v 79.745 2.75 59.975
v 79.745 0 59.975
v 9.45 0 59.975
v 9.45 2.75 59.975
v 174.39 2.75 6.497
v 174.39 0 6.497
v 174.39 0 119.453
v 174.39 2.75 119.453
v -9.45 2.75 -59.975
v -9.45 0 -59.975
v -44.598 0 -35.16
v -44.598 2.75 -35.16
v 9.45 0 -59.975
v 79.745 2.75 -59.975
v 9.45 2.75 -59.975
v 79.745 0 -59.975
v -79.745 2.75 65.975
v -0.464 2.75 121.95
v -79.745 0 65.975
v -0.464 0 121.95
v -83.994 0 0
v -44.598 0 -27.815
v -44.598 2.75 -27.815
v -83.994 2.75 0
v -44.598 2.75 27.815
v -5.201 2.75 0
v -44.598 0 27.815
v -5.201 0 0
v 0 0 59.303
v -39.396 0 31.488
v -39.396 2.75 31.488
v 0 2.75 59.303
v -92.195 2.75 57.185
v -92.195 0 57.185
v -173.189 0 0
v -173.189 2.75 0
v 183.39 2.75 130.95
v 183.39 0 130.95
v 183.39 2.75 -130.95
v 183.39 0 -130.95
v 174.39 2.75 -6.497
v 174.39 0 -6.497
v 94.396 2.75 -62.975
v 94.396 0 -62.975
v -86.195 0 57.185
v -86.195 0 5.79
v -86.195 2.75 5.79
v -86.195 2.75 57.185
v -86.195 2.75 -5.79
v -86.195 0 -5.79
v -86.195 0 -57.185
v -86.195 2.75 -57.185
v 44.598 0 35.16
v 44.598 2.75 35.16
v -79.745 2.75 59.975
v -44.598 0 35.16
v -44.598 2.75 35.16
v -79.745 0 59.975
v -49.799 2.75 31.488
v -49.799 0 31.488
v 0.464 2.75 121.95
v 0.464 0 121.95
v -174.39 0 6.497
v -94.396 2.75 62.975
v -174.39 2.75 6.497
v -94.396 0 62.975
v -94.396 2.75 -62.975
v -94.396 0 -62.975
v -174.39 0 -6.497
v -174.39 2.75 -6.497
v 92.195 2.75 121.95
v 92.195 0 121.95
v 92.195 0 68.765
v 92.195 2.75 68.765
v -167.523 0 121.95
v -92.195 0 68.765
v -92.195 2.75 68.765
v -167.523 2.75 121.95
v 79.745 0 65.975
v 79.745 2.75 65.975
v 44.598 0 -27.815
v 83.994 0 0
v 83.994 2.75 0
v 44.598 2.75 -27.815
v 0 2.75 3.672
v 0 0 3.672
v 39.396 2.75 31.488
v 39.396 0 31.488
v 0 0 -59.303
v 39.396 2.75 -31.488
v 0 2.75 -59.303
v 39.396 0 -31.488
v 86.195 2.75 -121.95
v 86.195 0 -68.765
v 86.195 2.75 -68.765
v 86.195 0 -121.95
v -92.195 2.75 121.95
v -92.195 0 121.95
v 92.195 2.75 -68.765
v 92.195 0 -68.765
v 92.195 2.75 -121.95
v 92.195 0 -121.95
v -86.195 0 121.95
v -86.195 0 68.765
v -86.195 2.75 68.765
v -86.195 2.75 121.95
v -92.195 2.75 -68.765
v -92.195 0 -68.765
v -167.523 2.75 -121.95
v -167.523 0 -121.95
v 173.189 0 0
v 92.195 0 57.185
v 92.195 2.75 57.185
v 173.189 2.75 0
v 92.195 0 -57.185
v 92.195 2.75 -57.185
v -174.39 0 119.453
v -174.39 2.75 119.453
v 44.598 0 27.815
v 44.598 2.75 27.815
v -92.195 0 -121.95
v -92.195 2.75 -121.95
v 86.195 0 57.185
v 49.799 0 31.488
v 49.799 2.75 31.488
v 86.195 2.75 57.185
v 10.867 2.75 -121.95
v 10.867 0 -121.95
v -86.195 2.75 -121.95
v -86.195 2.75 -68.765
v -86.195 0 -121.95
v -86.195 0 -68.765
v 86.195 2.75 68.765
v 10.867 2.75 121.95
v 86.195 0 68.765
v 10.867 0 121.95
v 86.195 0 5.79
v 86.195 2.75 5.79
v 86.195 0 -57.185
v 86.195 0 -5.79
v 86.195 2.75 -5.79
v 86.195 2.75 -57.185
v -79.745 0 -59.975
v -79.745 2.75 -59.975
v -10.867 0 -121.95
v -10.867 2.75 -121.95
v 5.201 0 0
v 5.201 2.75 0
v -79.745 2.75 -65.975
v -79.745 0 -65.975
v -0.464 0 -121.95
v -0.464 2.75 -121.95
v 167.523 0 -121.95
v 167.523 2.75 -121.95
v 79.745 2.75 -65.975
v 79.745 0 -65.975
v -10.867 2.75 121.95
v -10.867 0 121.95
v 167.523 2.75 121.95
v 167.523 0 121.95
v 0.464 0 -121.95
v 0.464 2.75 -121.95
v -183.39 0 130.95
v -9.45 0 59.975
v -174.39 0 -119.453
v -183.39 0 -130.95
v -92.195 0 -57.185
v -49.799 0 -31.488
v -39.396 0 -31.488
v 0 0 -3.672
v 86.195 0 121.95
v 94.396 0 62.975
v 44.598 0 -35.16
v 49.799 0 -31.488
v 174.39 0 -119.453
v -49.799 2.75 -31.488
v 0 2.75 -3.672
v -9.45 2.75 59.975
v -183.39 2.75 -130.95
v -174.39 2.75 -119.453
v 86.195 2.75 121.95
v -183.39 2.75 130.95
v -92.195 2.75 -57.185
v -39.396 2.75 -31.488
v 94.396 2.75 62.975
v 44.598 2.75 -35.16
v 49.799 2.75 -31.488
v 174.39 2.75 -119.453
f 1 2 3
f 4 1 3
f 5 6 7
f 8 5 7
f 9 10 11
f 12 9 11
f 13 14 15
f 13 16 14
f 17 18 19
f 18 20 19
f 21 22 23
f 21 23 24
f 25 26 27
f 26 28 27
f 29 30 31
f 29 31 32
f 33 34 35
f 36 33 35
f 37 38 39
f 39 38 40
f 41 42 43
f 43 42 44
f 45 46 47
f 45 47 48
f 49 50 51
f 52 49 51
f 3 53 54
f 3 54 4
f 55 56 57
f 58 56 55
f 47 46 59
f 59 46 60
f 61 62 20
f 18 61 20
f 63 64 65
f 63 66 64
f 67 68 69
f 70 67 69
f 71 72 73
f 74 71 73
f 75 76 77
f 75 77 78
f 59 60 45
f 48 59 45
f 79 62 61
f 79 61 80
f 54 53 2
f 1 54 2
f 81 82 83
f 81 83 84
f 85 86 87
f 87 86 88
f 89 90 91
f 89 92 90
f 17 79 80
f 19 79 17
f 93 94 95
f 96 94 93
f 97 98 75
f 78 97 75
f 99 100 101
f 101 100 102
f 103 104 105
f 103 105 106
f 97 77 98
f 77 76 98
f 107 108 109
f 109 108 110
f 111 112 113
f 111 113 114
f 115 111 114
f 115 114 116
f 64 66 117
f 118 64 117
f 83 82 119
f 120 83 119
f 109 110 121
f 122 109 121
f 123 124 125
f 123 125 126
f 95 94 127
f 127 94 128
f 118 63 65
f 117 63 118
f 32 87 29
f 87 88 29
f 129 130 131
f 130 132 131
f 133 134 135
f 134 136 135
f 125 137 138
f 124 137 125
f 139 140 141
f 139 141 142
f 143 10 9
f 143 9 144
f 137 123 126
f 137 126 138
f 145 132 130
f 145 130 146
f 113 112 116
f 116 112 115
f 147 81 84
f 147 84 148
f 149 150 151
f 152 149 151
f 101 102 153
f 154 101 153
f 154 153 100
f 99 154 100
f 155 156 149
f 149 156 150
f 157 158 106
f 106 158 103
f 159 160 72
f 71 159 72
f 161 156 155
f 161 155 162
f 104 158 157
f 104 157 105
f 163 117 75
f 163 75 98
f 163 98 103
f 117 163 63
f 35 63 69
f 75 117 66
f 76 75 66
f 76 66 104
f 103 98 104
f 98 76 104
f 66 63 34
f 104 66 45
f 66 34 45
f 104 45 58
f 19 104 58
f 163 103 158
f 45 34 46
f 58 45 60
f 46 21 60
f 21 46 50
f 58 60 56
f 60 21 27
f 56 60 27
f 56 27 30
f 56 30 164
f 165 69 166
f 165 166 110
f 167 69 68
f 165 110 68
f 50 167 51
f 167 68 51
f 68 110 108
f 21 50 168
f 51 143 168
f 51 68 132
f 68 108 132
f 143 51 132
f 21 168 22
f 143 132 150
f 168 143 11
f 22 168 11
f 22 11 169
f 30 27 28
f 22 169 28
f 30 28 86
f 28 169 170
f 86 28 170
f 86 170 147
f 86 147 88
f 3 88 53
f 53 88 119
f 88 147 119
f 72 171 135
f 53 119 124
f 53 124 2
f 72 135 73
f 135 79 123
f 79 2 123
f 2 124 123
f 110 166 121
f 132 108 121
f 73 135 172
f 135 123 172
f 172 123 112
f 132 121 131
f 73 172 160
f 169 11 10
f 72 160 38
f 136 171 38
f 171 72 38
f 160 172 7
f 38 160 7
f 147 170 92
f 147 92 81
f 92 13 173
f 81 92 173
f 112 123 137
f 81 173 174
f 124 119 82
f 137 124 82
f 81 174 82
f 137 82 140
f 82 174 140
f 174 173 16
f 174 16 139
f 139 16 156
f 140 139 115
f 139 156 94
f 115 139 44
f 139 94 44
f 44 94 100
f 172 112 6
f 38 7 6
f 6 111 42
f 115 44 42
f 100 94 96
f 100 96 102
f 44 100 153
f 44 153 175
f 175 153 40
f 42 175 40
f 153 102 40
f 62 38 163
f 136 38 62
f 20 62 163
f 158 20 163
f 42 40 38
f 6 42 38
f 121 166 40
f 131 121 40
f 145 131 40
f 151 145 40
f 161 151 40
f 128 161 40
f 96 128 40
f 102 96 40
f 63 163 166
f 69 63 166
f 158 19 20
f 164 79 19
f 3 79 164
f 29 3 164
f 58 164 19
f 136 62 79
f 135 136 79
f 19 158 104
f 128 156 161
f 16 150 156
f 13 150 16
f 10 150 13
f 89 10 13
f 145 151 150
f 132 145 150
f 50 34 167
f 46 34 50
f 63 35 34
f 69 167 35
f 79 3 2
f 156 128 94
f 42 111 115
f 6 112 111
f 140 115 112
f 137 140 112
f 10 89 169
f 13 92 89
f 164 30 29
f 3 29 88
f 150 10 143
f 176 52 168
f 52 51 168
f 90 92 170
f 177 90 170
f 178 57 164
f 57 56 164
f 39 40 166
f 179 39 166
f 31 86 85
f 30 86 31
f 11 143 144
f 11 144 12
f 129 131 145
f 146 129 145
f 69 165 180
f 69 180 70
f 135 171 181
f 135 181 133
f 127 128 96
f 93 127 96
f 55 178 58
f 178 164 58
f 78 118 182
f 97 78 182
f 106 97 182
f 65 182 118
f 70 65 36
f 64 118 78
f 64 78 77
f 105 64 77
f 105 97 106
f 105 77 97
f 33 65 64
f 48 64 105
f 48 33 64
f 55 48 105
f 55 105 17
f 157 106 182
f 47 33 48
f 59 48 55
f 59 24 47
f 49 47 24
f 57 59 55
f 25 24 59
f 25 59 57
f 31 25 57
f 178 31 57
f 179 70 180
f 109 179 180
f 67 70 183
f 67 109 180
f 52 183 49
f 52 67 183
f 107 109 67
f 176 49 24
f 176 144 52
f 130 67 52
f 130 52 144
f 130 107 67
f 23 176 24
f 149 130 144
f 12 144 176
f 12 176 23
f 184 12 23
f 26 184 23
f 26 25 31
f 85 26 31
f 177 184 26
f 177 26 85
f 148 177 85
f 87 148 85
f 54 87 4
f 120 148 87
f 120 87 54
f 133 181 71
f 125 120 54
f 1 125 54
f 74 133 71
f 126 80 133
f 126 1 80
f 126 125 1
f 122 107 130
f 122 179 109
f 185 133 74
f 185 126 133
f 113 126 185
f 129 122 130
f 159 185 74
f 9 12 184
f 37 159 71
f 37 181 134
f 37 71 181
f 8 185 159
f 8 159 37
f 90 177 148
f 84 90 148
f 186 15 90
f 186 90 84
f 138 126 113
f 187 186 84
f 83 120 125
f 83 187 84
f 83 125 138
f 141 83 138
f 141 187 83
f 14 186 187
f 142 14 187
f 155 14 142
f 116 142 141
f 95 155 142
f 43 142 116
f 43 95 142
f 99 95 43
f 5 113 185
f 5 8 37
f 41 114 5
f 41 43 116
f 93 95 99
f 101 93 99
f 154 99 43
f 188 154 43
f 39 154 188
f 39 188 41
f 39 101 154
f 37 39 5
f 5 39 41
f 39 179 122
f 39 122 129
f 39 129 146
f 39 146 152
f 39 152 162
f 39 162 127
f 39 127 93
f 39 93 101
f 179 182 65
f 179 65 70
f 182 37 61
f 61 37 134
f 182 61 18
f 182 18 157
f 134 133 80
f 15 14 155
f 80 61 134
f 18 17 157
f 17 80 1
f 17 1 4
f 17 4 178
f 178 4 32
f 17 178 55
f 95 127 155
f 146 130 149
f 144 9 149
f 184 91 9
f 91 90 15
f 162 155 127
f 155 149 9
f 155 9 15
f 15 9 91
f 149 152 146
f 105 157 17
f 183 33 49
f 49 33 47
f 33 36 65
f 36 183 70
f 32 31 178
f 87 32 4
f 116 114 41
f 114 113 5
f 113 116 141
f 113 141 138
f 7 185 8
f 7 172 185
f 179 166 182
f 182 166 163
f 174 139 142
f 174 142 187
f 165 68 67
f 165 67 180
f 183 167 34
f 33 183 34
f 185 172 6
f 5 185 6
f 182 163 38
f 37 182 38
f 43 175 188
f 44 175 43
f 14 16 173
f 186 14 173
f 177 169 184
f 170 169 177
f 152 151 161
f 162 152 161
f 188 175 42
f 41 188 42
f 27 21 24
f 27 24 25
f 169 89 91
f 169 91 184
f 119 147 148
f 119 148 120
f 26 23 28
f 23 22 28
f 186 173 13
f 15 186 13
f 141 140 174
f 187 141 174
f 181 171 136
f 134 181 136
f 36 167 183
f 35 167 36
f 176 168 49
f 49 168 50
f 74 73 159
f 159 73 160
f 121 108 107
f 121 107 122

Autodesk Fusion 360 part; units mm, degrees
sketch "Sketch1" plane through (0, 0, 0) normal (0, 1, 0) x (1, 0, 0)
  line L0 (178.39, 125.95) -> (-178.39, 125.95)
  line L1 (-178.39, 125.95) -> (-178.39, -125.95)
  line L2 (-178.39, -125.95) -> (178.39, -125.95)
  line L3 (178.39, -125.95) -> (178.39, 125.95)
  line L4 (178.39, 125.95) -> (-178.39, -125.95) construction
  line L5 (-178.39, 125.95) -> (178.39, -125.95) construction
  line L6 (-178.39, 0) -> (0, 125.95) construction
  line L7 (0, 125.95) -> (178.39, 0) construction
  line L8 (178.39, 0) -> (0, -125.95) construction
  line L9 (-178.39, 0) -> (0, -125.95) construction
  line L10 (-89.195, -62.975) -> (89.195, -62.975) construction
  line L11 (-89.195, 62.975) -> (89.195, 62.975) construction
  line L12 (89.195, 62.975) -> (89.195, -62.975) construction
  line L13 (-89.195, -62.975) -> (-89.195, 62.975) construction
  line L14 (-89.195, 0) -> (0, 62.975) construction
  line L15 (0, 62.975) -> (89.195, 0) construction
  line L16 (89.195, 0) -> (0, -62.975) construction
  line L17 (-89.195, 0) -> (0, -62.975) construction
  line L18 (-89.195, -62.975) -> (-89.195, -125.95) construction
  line L19 (89.195, -62.975) -> (89.195, -125.95) construction
  line L20 (89.195, 62.975) -> (89.195, 125.95) construction
  line L21 (-89.195, 62.975) -> (-89.195, 125.95) construction
  line L22 (-178.39, 125.95) -> (-89.195, 62.975)
  line L23 (-89.195, 62.975) -> (-90.9253, 60.5243)
  line L24 (-90.9253, 60.5243) -> (-180.1203, 123.4993)
  line L25 (-180.1203, 123.4993) -> (-178.39, 125.95)
  line L26 (-87.4647, 65.4257) -> (-176.6597, 128.4007)
  line L27 (-89.195, 62.975) -> (-87.4647, 65.4257)
  line L28 (-176.6597, 128.4007) -> (-178.39, 125.95)
  line L29 (-89.195, 125.95) -> (-89.195, 62.975)
  line L30 (-89.195, 62.975) -> (-92.195, 62.975)
  line L31 (-92.195, 62.975) -> (-92.195, 125.95)
  line L32 (-92.195, 125.95) -> (-89.195, 125.95)
  line L33 (-86.195, 62.975) -> (-86.195, 125.95)
  line L34 (-89.195, 62.975) -> (-86.195, 62.975)
  line L35 (-178.39, 0) -> (-89.195, 62.975)
  line L36 (-89.195, 62.975) -> (-90.9253, 65.4257)
  line L37 (-90.9253, 65.4257) -> (-180.1203, 2.4507)
  line L38 (-180.1203, 2.4507) -> (-178.39, 0)
  line L39 (-87.4647, 60.5243) -> (-176.6597, -2.4507)
  line L40 (-89.195, 62.975) -> (-87.4647, 60.5243)
  line L41 (-89.195, 62.975) -> (-89.195, 0)
  line L42 (-89.195, 0) -> (-92.195, 0)
  line L43 (-92.195, 0) -> (-92.195, 62.975)
  line L44 (-92.195, 62.975) -> (-89.195, 62.975)
  line L45 (-86.195, 0) -> (-86.195, 62.975)
  line L46 (-89.195, 0) -> (-86.195, 0)
  line L47 (-89.195, 0) -> (0, 62.975)
  line L48 (0, 62.975) -> (1.7303, 60.5243)
  line L49 (1.7303, 60.5243) -> (-87.4647, -2.4507)
  line L50 (-87.4647, -2.4507) -> (-89.195, 0)
  line L51 (0, 62.975) -> (-1.7303, 65.4257)
  line L52 (-1.7303, 65.4257) -> (-90.9253, 2.4507)
  line L53 (178.39, -125.95) -> (-89.195, 62.975)
  line L54 (-89.195, 62.975) -> (-87.4647, 65.4257)
  line L55 (-87.4647, 65.4257) -> (180.1203, -123.4993)
  line L56 (180.1203, -123.4993) -> (178.39, -125.95)
  line L57 (-90.9253, 60.5243) -> (176.6597, -128.4007)
  line L58 (0, 125.95) -> (-89.195, 62.975)
  line L59 (-89.195, 62.975) -> (-87.4647, 60.5243)
  line L60 (-87.4647, 60.5243) -> (1.7303, 123.4993)
  line L61 (1.7303, 123.4993) -> (0, 125.95)
  line L62 (-90.9253, 65.4257) -> (-1.7303, 128.4007)
  line L63 (-89.195, 62.975) -> (89.195, 62.975)
  line L64 (89.195, 62.975) -> (89.195, 65.975)
  line L65 (89.195, 65.975) -> (-89.195, 65.975)
  line L66 (-89.195, 65.975) -> (-89.195, 62.975)
  line L67 (89.195, 59.975) -> (-89.195, 59.975)
  line L68 (0, 62.975) -> (89.195, 0)
  line L69 (89.195, 0) -> (90.9253, 2.4507)
  line L70 (90.9253, 2.4507) -> (1.7303, 65.4257)
  line L71 (1.7303, 65.4257) -> (0, 62.975)
  line L72 (87.4647, -2.4507) -> (-1.7303, 60.5243)
  line L73 (-178.39, -125.95) -> (178.39, 125.95)
  line L74 (178.39, 125.95) -> (176.6597, 128.4007)
  line L75 (176.6597, 128.4007) -> (-180.1203, -123.4993)
  line L76 (-180.1203, -123.4993) -> (-178.39, -125.95)
  line L77 (180.1203, 123.4993) -> (-176.6597, -128.4007)
  line L78 (-89.195, -125.95) -> (-89.195, 0)
  line L79 (-89.195, 0) -> (-92.195, 0)
  line L80 (-92.195, 0) -> (-92.195, -125.95)
  line L81 (-92.195, -125.95) -> (-89.195, -125.95)
  line L82 (-86.195, 0) -> (-86.195, -125.95)
  line L83 (-178.39, 0) -> (0, -125.95)
  line L84 (0, -125.95) -> (1.7303, -123.4993)
  line L85 (1.7303, -123.4993) -> (-176.6597, 2.4507)
  line L86 (-176.6597, 2.4507) -> (-178.39, 0)
  line L87 (-1.7303, -128.4007) -> (-180.1203, -2.4507)
  line L88 (0, -62.975) -> (-89.195, 0)
  line L89 (-89.195, 0) -> (-87.4647, 2.4507)
  line L90 (-87.4647, 2.4507) -> (1.7303, -60.5243)
  line L91 (1.7303, -60.5243) -> (0, -62.975)
  line L92 (-90.9253, -2.4507) -> (-1.7303, -65.4257)
  line L93 (178.39, 0) -> (0, -125.95)
  line L94 (0, -125.95) -> (-1.7303, -123.4993)
  line L95 (-1.7303, -123.4993) -> (176.6597, 2.4507)
  line L96 (176.6597, 2.4507) -> (178.39, 0)
  line L97 (1.7303, -128.4007) -> (180.1203, -2.4507)
  line L98 (0, 125.95) -> (178.39, 0)
  line L99 (178.39, 0) -> (180.1203, 2.4507)
  line L100 (180.1203, 2.4507) -> (1.7303, 128.4007)
  line L101 (1.7303, 128.4007) -> (0, 125.95)
  line L102 (176.6597, -2.4507) -> (-1.7303, 123.4993)
  line L103 (89.195, 125.95) -> (89.195, -125.95)
  line L104 (89.195, -125.95) -> (92.195, -125.95)
  line L105 (92.195, -125.95) -> (92.195, 125.95)
  line L106 (92.195, 125.95) -> (89.195, 125.95)
  line L107 (86.195, -125.95) -> (86.195, 125.95)
  line L108 (0, -62.975) -> (89.195, 0)
  line L109 (89.195, 0) -> (87.4647, 2.4507)
  line L110 (87.4647, 2.4507) -> (-1.7303, -60.5243)
  line L111 (-1.7303, -60.5243) -> (0, -62.975)
  line L112 (90.9253, -2.4507) -> (1.7303, -65.4257)
  line L113 (-89.195, -62.975) -> (89.195, -62.975)
  line L114 (89.195, -62.975) -> (89.195, -59.975)
  line L115 (89.195, -59.975) -> (-89.195, -59.975)
  line L116 (-89.195, -59.975) -> (-89.195, -62.975)
  line L117 (89.195, -65.975) -> (-89.195, -65.975)
  line L118 (-178.39, 125.95) -> (-174.39, 125.95)
  line L119 (-174.39, 125.95) -> (-174.39, -126.4932)
  line L120 (-174.39, -126.4932) -> (-178.39, -126.4932)
  line L121 (-178.39, -126.4932) -> (-178.39, 125.95)
  line L122 (-178.39, -125.95) -> (178.39, -125.95)
  line L123 (178.39, -125.95) -> (178.39, -121.95)
  line L124 (178.39, -121.95) -> (-178.39, -121.95)
  line L125 (-178.39, -121.95) -> (-178.39, -125.95)
  line L126 (178.39, 125.95) -> (174.39, 125.95)
  line L127 (174.39, 125.95) -> (174.39, -125.95)
  line L128 (174.39, -125.95) -> (178.39, -125.95)
  line L129 (178.39, -125.95) -> (178.39, 125.95)
  line L130 (178.39, 125.95) -> (-178.39, 125.95)
  line L131 (-178.39, 125.95) -> (-178.39, 121.95)
  line L132 (-178.39, 121.95) -> (178.39, 121.95)
  line L133 (178.39, 121.95) -> (178.39, 125.95)
  line L134 (183.39, 130.95) -> (-183.39, 130.95)
  line L135 (-183.39, 130.95) -> (-183.39, -130.95)
  line L136 (-183.39, -130.95) -> (183.39, -130.95)
  line L137 (183.39, -130.95) -> (183.39, 130.95)
  line L138 (183.39, 130.95) -> (-183.39, -130.95) construction
  line L139 (-183.39, 130.95) -> (183.39, -130.95) construction
  line L140 (0, 130.95) -> (0, 125.95) construction
  line L141 (-183.39, 66.313) -> (-178.39, 66.313) construction
  dimension "d1" = 356.78
  dimension "d2" = 251.9
  dimension "d3" = 3
  dimension "d4" = 3
  dimension "d5" = 3
  dimension "d6" = 3
  dimension "d7" = 3
  dimension "d8" = 3
  dimension "d9" = 3
  dimension "d10" = 3
  dimension "d11" = 3
  dimension "d12" = 3
  dimension "d13" = 3
  dimension "d14" = 3
  dimension "d15" = 3
  dimension "d16" = 3
  dimension "d17" = 3
  dimension "d18" = 3
  dimension "d19" = 3
  dimension "d20" = 3
  dimension "d21" = 4
  dimension "d22" = 4
  dimension "d23" = 4
  dimension "d24" = 4
  dimension "d27" = 5
extrude "Extrude1" add sketch "Sketch1" along normal blind 2.75 contours L0 L73 L126 L127 L130 | L3 L73 L77 L127 L129 L132 L133 | L0 L74 L75 L126 L130 | L0 L73 L75 L127 L130 L132 | L3 L77 L129 L132 L133 | L73 L127 L132 | L0 L75 L105 L130 L132 | L3 L77 L100 L127 L129 L132 | L77 L127 L132 | L73 L77 L100 L105 L127 L132 | L73 L75 L105 L132 | L0 L103 L105 L106 L130 L132 | L3 L99 L100 L129 | L3 L95 L96 L98 L100 L127 L129 | L73 L100 L105 | L73 L75 L100 L105 | L0 L103 L107 L130 L132 | L75 L103 L105 L132 | L3 L93 L97 L127 L129 | L95 L96 L98 | L93 L95 L98 L102 L127 | L77 L98 L100 L105 L127 | L77 L100 L105 | L73 L77 L98 L100 L105 | L64 L73 L100 L103 | L0 L100 L107 L130 L132 | L100 L103 L107 L132 | L65 L75 L103 | L65 L75 L100 L107 | L3 L55 L97 L124 L127 L129 | L93 L102 L127 | L95 L98 L127 | L95 L98 L102 L105 L127 | L77 L98 L105 | L63 L73 L102 L107 | L64 L65 L75 L98 L103 | L67 L73 L102 L103 | L63 L75 L98 L107 | L77 L98 L103 | L0 L98 L100 L130 L132 | L0 L100 L101 L130 | L65 L75 L98 L107 | L65 L98 L100 L107 L132 | L3 L55 L123 L124 L129 | L55 L93 L97 L105 L127 | L93 L95 L102 L105 L127 | L95 L102 L127 | L77 L98 L102 L105 | L63 L102 L107 | L63 L75 L107 | L67 L73 L102 L107 | L73 L102 L107 | L75 L98 L107 | L67 L102 L103 | L0 L58 L62 L130 L132 | L58 L60 L61 L132 | L60 L61 L98 L102 L132 | L65 L98 L107 | L3 L55 L56 L123 L129 | L3 L53 L55 L123 L124 L127 L129 | L55 L124 L127 | L55 L97 L105 | L53 L55 L97 L105 L124 L127 | L55 L93 L105 | L55 L93 L95 L105 | L69 L70 L95 L102 L103 L105 | L70 L77 L103 L107 | L67 L77 L102 L107 | L63 L67 L70 L75 | L65 L75 L98 L102 L107 | L67 L73 L75 L102 L107 | L51 L52 L60 L63 L65 L70 L71 L102 | L67 L73 L107 | L0 L33 L62 L130 L132 | L58 L60 L65 L132 | L33 L58 L62 L65 L132 | L65 L98 L102 L132 | L2 L53 L122 L127 L128 | L53 L124 L127 | L53 L55 L93 L97 L105 | L53 L97 L105 | L55 L93 L103 L114 | L67 L70 L73 L77 L107 | L68 L70 L103 L107 L109 L110 | L69 L70 L103 | L63 L67 L68 L70 | L63 L70 L71 | L67 L70 L73 L75 | L0 L29 L33 L130 L132 | L33 L55 L58 L60 L65 | L33 L58 L65 | L60 L102 L132 | L2 L53 L57 L122 L124 L127 | L53 L57 L105 L124 | L53 L97 L103 | L53 L57 L97 L105 | L55 L95 L107 L115 | L95 L103 L115 | L55 L103 L107 L112 | L53 L95 L107 L113 | L57 L93 L103 L117 | L53 L95 L103 L114 L115 | L57 L93 L107 L113 | L68 L70 L73 L77 | L68 L70 L77 L107 | L68 L72 L107 L108 L110 | L103 L107 L108 L112 | L68 L109 L110 | L47 L48 L49 L67 | L48 L49 L67 L68 | L51 L52 L63 | L47 L52 L63 L67 | L67 L68 L70 L75 | L68 L70 L73 L75 | L0 L29 L31 L32 L130 L132 | L29 L33 L62 L132 | L26 L33 L62 L65 | L26 L33 L55 L58 L65 | L33 L55 L58 | L2 L57 L105 L122 L124 | L57 L97 L107 L117 | L97 L103 L107 L124 | L57 L103 L117 | L57 L103 L105 L124 | L53 L55 L107 L112 L115 | L53 L95 L107 L115 | L53 L95 L107 | L57 L93 L107 | L57 L93 L107 L117 | L95 L107 L113 | L57 L107 L113 | L68 L72 L73 L77 | L68 L72 L77 L107 L110 | L68 L107 L110 | L72 L107 L108 | L47 L49 L55 L67 L72 | L47 L52 L55 L67 | L52 L55 L63 L67 | L49 L67 L68 L72 L75 | L68 L72 L73 L75 | L33 L55 L63 | L45 L53 L55 L60 L67 | L45 L60 L63 | L0 L26 L31 L130 L132 | L26 L29 L31 L132 | L22 L26 L31 L37 L62 | L26 L29 L65 | L29 L36 L62 L66 | L33 L34 L55 L58 L63 | L27 L54 L55 L58 | L26 L27 L29 L54 L65 L66 | L2 L103 L104 L105 L122 L124 | L93 L97 L107 L117 L124 | L2 L103 L107 L122 L124 | L53 L55 L108 L112 | L55 L107 L108 L112 | L53 L107 L115 | L53 L57 L95 L107 L115 | L57 L93 L95 L107 L117 | L93 L107 L117 | L57 L112 L113 L115 | L85 L95 L113 L117 | L55 L72 L73 L77 | L72 L107 L110 | L55 L72 L107 L108 L110 | L47 L49 L53 L55 | L47 L52 L53 L55 | L49 L67 L72 | L55 L72 L73 L75 | L52 L53 L55 L67 | L34 L45 L53 L60 L63 | L45 L53 L60 | L0 L22 L26 L119 L130 L132 | L0 L26 L28 L118 L130 | L22 L26 L31 L132 | L22 L36 L37 | L22 L30 L31 L37 L44 | L23 L41 L57 | L24 L30 L35 L43 L44 | L23 L24 L35 | L40 L53 L59 L60 | L39 L40 L41 L59 L67 | L2 L97 L107 L122 L124 | L2 L93 L97 L122 L124 | L53 L55 L108 L110 | L53 L57 L108 L112 | L53 L57 L112 L115 | L93 L95 L117 L124 | L108 L112 L113 L115 | L53 L55 L73 L77 | L53 L55 L77 L110 | L47 L49 L53 L57 | L47 L52 L53 L57 | L49 L53 L55 L75 | L53 L55 L73 L75 | L45 L53 L67 | L45 L52 L53 L57 L67 | L39 L45 L53 L60 L67 | L0 L22 L118 L119 L130 | L22 L24 L31 L37 L119 L132 | L22 L31 L37 | L24 L35 L39 L43 L57 | L24 L31 L37 L43 | L24 L35 L43 | L39 L41 L67 | L84 L85 L93 L95 L124 | L53 L57 L108 L110 | L57 L108 L112 L115 | L85 L95 L124 | L77 L82 L83 L85 L117 | L83 L85 L117 L124 | L88 L92 L113 L115 | L90 L91 L110 L111 L115 | L90 L91 L108 L115 | L88 L110 L111 L115 | L53 L57 L73 L77 | L53 L57 L77 L110 | L45 L47 L49 L57 L90 | L45 L47 L52 L57 | L49 L53 L57 L75 | L53 L57 L73 L75 | L39 L45 L57 L67 | L1 L22 L24 L119 L121 L131 L132 | L1 L24 L25 L121 L131 | L22 L119 L132 | L39 L41 L42 L43 L79 | L41 L45 L52 L57 | L24 L35 L37 L43 L119 | L35 L39 L43 L85 L119 | L2 L83 L87 L122 L124 | L84 L85 L94 L95 | L83 L85 L94 L95 L124 | L57 L90 L108 L110 L115 | L73 L77 L82 L85 L115 | L82 L85 L113 | L77 L82 L113 | L77 L92 L113 L115 | L82 L83 L117 | L82 L83 L87 L117 L124 | L77 L88 L92 L115 | L77 L88 L90 L110 L115 | L57 L73 L77 L90 | L41 L45 L47 L52 L89 L90 | L45 L47 L90 | L57 L73 L75 L90 | L1 L24 L121 L131 L132 | L24 L119 L132 | L35 L85 L119 | L1 L35 L37 L85 L86 L119 L121 | L2 L82 L87 L122 L124 | L90 L110 L115 | L73 L77 L92 L115 | L77 L82 L83 | L77 L82 L83 L113 | L73 L82 L85 | L73 L82 L85 L113 | L77 L82 L83 L117 | L77 L82 L87 L117 | L73 L77 L88 L90 | L73 L77 L88 L92 | L45 L49 L82 L90 | L45 L46 L47 L90 | L47 L89 L90 | L49 L75 L82 L88 L90 | L73 L75 L88 L90 | L1 L24 L37 L119 L121 L132 | L39 L80 L83 L85 L119 | L39 L85 L119 | L42 L78 L79 L80 L85 | L49 L50 L88 | L49 L50 L78 L82 L88 L92 | L46 L49 L82 L88 | L35 L39 L83 L85 L119 | L35 L85 L86 | L2 L78 L82 L122 L124 | L73 L75 L82 L92 L115 | L73 L82 L115 | L77 L78 L83 L117 | L73 L82 L85 L115 | L73 L78 L85 L115 L116 | L73 L78 L87 | L75 L78 L83 L116 | L73 L75 L80 L83 L87 | L78 L82 L87 L124 | L77 L78 L117 | L73 L75 L88 L92 | L49 L82 L88 | L75 L82 L88 L92 | L1 L37 L38 L121 | L39 L83 L119 | L75 L80 L83 L85 | L75 L78 L82 L92 | L1 L83 L87 L119 L121 | L2 L78 L80 L81 L122 L124 | L75 L82 L85 L115 | L78 L85 L115 | L73 L77 L80 L87 | L73 L80 L87 | L75 L80 L83 | L77 L78 L80 L124 | L75 L80 L83 L87 L119 | L1 L75 L87 L119 L121 L124 | L2 L77 L80 L122 L124 | L73 L77 L80 L124 | L73 L75 L80 L87 L119 L124 | L75 L80 L87 | L1 L75 L121 L124 L125 | L2 L73 L77 L119 L122 L124 | L73 L119 L124 | L75 L119 L124 | L1 L73 L75 L119 L121 L124 L125 | L1 L75 L76 L121 L125 | L2 L119 L120 L121 L122 | L2 L73 L119 L122 | L134 L135 L136 L137
